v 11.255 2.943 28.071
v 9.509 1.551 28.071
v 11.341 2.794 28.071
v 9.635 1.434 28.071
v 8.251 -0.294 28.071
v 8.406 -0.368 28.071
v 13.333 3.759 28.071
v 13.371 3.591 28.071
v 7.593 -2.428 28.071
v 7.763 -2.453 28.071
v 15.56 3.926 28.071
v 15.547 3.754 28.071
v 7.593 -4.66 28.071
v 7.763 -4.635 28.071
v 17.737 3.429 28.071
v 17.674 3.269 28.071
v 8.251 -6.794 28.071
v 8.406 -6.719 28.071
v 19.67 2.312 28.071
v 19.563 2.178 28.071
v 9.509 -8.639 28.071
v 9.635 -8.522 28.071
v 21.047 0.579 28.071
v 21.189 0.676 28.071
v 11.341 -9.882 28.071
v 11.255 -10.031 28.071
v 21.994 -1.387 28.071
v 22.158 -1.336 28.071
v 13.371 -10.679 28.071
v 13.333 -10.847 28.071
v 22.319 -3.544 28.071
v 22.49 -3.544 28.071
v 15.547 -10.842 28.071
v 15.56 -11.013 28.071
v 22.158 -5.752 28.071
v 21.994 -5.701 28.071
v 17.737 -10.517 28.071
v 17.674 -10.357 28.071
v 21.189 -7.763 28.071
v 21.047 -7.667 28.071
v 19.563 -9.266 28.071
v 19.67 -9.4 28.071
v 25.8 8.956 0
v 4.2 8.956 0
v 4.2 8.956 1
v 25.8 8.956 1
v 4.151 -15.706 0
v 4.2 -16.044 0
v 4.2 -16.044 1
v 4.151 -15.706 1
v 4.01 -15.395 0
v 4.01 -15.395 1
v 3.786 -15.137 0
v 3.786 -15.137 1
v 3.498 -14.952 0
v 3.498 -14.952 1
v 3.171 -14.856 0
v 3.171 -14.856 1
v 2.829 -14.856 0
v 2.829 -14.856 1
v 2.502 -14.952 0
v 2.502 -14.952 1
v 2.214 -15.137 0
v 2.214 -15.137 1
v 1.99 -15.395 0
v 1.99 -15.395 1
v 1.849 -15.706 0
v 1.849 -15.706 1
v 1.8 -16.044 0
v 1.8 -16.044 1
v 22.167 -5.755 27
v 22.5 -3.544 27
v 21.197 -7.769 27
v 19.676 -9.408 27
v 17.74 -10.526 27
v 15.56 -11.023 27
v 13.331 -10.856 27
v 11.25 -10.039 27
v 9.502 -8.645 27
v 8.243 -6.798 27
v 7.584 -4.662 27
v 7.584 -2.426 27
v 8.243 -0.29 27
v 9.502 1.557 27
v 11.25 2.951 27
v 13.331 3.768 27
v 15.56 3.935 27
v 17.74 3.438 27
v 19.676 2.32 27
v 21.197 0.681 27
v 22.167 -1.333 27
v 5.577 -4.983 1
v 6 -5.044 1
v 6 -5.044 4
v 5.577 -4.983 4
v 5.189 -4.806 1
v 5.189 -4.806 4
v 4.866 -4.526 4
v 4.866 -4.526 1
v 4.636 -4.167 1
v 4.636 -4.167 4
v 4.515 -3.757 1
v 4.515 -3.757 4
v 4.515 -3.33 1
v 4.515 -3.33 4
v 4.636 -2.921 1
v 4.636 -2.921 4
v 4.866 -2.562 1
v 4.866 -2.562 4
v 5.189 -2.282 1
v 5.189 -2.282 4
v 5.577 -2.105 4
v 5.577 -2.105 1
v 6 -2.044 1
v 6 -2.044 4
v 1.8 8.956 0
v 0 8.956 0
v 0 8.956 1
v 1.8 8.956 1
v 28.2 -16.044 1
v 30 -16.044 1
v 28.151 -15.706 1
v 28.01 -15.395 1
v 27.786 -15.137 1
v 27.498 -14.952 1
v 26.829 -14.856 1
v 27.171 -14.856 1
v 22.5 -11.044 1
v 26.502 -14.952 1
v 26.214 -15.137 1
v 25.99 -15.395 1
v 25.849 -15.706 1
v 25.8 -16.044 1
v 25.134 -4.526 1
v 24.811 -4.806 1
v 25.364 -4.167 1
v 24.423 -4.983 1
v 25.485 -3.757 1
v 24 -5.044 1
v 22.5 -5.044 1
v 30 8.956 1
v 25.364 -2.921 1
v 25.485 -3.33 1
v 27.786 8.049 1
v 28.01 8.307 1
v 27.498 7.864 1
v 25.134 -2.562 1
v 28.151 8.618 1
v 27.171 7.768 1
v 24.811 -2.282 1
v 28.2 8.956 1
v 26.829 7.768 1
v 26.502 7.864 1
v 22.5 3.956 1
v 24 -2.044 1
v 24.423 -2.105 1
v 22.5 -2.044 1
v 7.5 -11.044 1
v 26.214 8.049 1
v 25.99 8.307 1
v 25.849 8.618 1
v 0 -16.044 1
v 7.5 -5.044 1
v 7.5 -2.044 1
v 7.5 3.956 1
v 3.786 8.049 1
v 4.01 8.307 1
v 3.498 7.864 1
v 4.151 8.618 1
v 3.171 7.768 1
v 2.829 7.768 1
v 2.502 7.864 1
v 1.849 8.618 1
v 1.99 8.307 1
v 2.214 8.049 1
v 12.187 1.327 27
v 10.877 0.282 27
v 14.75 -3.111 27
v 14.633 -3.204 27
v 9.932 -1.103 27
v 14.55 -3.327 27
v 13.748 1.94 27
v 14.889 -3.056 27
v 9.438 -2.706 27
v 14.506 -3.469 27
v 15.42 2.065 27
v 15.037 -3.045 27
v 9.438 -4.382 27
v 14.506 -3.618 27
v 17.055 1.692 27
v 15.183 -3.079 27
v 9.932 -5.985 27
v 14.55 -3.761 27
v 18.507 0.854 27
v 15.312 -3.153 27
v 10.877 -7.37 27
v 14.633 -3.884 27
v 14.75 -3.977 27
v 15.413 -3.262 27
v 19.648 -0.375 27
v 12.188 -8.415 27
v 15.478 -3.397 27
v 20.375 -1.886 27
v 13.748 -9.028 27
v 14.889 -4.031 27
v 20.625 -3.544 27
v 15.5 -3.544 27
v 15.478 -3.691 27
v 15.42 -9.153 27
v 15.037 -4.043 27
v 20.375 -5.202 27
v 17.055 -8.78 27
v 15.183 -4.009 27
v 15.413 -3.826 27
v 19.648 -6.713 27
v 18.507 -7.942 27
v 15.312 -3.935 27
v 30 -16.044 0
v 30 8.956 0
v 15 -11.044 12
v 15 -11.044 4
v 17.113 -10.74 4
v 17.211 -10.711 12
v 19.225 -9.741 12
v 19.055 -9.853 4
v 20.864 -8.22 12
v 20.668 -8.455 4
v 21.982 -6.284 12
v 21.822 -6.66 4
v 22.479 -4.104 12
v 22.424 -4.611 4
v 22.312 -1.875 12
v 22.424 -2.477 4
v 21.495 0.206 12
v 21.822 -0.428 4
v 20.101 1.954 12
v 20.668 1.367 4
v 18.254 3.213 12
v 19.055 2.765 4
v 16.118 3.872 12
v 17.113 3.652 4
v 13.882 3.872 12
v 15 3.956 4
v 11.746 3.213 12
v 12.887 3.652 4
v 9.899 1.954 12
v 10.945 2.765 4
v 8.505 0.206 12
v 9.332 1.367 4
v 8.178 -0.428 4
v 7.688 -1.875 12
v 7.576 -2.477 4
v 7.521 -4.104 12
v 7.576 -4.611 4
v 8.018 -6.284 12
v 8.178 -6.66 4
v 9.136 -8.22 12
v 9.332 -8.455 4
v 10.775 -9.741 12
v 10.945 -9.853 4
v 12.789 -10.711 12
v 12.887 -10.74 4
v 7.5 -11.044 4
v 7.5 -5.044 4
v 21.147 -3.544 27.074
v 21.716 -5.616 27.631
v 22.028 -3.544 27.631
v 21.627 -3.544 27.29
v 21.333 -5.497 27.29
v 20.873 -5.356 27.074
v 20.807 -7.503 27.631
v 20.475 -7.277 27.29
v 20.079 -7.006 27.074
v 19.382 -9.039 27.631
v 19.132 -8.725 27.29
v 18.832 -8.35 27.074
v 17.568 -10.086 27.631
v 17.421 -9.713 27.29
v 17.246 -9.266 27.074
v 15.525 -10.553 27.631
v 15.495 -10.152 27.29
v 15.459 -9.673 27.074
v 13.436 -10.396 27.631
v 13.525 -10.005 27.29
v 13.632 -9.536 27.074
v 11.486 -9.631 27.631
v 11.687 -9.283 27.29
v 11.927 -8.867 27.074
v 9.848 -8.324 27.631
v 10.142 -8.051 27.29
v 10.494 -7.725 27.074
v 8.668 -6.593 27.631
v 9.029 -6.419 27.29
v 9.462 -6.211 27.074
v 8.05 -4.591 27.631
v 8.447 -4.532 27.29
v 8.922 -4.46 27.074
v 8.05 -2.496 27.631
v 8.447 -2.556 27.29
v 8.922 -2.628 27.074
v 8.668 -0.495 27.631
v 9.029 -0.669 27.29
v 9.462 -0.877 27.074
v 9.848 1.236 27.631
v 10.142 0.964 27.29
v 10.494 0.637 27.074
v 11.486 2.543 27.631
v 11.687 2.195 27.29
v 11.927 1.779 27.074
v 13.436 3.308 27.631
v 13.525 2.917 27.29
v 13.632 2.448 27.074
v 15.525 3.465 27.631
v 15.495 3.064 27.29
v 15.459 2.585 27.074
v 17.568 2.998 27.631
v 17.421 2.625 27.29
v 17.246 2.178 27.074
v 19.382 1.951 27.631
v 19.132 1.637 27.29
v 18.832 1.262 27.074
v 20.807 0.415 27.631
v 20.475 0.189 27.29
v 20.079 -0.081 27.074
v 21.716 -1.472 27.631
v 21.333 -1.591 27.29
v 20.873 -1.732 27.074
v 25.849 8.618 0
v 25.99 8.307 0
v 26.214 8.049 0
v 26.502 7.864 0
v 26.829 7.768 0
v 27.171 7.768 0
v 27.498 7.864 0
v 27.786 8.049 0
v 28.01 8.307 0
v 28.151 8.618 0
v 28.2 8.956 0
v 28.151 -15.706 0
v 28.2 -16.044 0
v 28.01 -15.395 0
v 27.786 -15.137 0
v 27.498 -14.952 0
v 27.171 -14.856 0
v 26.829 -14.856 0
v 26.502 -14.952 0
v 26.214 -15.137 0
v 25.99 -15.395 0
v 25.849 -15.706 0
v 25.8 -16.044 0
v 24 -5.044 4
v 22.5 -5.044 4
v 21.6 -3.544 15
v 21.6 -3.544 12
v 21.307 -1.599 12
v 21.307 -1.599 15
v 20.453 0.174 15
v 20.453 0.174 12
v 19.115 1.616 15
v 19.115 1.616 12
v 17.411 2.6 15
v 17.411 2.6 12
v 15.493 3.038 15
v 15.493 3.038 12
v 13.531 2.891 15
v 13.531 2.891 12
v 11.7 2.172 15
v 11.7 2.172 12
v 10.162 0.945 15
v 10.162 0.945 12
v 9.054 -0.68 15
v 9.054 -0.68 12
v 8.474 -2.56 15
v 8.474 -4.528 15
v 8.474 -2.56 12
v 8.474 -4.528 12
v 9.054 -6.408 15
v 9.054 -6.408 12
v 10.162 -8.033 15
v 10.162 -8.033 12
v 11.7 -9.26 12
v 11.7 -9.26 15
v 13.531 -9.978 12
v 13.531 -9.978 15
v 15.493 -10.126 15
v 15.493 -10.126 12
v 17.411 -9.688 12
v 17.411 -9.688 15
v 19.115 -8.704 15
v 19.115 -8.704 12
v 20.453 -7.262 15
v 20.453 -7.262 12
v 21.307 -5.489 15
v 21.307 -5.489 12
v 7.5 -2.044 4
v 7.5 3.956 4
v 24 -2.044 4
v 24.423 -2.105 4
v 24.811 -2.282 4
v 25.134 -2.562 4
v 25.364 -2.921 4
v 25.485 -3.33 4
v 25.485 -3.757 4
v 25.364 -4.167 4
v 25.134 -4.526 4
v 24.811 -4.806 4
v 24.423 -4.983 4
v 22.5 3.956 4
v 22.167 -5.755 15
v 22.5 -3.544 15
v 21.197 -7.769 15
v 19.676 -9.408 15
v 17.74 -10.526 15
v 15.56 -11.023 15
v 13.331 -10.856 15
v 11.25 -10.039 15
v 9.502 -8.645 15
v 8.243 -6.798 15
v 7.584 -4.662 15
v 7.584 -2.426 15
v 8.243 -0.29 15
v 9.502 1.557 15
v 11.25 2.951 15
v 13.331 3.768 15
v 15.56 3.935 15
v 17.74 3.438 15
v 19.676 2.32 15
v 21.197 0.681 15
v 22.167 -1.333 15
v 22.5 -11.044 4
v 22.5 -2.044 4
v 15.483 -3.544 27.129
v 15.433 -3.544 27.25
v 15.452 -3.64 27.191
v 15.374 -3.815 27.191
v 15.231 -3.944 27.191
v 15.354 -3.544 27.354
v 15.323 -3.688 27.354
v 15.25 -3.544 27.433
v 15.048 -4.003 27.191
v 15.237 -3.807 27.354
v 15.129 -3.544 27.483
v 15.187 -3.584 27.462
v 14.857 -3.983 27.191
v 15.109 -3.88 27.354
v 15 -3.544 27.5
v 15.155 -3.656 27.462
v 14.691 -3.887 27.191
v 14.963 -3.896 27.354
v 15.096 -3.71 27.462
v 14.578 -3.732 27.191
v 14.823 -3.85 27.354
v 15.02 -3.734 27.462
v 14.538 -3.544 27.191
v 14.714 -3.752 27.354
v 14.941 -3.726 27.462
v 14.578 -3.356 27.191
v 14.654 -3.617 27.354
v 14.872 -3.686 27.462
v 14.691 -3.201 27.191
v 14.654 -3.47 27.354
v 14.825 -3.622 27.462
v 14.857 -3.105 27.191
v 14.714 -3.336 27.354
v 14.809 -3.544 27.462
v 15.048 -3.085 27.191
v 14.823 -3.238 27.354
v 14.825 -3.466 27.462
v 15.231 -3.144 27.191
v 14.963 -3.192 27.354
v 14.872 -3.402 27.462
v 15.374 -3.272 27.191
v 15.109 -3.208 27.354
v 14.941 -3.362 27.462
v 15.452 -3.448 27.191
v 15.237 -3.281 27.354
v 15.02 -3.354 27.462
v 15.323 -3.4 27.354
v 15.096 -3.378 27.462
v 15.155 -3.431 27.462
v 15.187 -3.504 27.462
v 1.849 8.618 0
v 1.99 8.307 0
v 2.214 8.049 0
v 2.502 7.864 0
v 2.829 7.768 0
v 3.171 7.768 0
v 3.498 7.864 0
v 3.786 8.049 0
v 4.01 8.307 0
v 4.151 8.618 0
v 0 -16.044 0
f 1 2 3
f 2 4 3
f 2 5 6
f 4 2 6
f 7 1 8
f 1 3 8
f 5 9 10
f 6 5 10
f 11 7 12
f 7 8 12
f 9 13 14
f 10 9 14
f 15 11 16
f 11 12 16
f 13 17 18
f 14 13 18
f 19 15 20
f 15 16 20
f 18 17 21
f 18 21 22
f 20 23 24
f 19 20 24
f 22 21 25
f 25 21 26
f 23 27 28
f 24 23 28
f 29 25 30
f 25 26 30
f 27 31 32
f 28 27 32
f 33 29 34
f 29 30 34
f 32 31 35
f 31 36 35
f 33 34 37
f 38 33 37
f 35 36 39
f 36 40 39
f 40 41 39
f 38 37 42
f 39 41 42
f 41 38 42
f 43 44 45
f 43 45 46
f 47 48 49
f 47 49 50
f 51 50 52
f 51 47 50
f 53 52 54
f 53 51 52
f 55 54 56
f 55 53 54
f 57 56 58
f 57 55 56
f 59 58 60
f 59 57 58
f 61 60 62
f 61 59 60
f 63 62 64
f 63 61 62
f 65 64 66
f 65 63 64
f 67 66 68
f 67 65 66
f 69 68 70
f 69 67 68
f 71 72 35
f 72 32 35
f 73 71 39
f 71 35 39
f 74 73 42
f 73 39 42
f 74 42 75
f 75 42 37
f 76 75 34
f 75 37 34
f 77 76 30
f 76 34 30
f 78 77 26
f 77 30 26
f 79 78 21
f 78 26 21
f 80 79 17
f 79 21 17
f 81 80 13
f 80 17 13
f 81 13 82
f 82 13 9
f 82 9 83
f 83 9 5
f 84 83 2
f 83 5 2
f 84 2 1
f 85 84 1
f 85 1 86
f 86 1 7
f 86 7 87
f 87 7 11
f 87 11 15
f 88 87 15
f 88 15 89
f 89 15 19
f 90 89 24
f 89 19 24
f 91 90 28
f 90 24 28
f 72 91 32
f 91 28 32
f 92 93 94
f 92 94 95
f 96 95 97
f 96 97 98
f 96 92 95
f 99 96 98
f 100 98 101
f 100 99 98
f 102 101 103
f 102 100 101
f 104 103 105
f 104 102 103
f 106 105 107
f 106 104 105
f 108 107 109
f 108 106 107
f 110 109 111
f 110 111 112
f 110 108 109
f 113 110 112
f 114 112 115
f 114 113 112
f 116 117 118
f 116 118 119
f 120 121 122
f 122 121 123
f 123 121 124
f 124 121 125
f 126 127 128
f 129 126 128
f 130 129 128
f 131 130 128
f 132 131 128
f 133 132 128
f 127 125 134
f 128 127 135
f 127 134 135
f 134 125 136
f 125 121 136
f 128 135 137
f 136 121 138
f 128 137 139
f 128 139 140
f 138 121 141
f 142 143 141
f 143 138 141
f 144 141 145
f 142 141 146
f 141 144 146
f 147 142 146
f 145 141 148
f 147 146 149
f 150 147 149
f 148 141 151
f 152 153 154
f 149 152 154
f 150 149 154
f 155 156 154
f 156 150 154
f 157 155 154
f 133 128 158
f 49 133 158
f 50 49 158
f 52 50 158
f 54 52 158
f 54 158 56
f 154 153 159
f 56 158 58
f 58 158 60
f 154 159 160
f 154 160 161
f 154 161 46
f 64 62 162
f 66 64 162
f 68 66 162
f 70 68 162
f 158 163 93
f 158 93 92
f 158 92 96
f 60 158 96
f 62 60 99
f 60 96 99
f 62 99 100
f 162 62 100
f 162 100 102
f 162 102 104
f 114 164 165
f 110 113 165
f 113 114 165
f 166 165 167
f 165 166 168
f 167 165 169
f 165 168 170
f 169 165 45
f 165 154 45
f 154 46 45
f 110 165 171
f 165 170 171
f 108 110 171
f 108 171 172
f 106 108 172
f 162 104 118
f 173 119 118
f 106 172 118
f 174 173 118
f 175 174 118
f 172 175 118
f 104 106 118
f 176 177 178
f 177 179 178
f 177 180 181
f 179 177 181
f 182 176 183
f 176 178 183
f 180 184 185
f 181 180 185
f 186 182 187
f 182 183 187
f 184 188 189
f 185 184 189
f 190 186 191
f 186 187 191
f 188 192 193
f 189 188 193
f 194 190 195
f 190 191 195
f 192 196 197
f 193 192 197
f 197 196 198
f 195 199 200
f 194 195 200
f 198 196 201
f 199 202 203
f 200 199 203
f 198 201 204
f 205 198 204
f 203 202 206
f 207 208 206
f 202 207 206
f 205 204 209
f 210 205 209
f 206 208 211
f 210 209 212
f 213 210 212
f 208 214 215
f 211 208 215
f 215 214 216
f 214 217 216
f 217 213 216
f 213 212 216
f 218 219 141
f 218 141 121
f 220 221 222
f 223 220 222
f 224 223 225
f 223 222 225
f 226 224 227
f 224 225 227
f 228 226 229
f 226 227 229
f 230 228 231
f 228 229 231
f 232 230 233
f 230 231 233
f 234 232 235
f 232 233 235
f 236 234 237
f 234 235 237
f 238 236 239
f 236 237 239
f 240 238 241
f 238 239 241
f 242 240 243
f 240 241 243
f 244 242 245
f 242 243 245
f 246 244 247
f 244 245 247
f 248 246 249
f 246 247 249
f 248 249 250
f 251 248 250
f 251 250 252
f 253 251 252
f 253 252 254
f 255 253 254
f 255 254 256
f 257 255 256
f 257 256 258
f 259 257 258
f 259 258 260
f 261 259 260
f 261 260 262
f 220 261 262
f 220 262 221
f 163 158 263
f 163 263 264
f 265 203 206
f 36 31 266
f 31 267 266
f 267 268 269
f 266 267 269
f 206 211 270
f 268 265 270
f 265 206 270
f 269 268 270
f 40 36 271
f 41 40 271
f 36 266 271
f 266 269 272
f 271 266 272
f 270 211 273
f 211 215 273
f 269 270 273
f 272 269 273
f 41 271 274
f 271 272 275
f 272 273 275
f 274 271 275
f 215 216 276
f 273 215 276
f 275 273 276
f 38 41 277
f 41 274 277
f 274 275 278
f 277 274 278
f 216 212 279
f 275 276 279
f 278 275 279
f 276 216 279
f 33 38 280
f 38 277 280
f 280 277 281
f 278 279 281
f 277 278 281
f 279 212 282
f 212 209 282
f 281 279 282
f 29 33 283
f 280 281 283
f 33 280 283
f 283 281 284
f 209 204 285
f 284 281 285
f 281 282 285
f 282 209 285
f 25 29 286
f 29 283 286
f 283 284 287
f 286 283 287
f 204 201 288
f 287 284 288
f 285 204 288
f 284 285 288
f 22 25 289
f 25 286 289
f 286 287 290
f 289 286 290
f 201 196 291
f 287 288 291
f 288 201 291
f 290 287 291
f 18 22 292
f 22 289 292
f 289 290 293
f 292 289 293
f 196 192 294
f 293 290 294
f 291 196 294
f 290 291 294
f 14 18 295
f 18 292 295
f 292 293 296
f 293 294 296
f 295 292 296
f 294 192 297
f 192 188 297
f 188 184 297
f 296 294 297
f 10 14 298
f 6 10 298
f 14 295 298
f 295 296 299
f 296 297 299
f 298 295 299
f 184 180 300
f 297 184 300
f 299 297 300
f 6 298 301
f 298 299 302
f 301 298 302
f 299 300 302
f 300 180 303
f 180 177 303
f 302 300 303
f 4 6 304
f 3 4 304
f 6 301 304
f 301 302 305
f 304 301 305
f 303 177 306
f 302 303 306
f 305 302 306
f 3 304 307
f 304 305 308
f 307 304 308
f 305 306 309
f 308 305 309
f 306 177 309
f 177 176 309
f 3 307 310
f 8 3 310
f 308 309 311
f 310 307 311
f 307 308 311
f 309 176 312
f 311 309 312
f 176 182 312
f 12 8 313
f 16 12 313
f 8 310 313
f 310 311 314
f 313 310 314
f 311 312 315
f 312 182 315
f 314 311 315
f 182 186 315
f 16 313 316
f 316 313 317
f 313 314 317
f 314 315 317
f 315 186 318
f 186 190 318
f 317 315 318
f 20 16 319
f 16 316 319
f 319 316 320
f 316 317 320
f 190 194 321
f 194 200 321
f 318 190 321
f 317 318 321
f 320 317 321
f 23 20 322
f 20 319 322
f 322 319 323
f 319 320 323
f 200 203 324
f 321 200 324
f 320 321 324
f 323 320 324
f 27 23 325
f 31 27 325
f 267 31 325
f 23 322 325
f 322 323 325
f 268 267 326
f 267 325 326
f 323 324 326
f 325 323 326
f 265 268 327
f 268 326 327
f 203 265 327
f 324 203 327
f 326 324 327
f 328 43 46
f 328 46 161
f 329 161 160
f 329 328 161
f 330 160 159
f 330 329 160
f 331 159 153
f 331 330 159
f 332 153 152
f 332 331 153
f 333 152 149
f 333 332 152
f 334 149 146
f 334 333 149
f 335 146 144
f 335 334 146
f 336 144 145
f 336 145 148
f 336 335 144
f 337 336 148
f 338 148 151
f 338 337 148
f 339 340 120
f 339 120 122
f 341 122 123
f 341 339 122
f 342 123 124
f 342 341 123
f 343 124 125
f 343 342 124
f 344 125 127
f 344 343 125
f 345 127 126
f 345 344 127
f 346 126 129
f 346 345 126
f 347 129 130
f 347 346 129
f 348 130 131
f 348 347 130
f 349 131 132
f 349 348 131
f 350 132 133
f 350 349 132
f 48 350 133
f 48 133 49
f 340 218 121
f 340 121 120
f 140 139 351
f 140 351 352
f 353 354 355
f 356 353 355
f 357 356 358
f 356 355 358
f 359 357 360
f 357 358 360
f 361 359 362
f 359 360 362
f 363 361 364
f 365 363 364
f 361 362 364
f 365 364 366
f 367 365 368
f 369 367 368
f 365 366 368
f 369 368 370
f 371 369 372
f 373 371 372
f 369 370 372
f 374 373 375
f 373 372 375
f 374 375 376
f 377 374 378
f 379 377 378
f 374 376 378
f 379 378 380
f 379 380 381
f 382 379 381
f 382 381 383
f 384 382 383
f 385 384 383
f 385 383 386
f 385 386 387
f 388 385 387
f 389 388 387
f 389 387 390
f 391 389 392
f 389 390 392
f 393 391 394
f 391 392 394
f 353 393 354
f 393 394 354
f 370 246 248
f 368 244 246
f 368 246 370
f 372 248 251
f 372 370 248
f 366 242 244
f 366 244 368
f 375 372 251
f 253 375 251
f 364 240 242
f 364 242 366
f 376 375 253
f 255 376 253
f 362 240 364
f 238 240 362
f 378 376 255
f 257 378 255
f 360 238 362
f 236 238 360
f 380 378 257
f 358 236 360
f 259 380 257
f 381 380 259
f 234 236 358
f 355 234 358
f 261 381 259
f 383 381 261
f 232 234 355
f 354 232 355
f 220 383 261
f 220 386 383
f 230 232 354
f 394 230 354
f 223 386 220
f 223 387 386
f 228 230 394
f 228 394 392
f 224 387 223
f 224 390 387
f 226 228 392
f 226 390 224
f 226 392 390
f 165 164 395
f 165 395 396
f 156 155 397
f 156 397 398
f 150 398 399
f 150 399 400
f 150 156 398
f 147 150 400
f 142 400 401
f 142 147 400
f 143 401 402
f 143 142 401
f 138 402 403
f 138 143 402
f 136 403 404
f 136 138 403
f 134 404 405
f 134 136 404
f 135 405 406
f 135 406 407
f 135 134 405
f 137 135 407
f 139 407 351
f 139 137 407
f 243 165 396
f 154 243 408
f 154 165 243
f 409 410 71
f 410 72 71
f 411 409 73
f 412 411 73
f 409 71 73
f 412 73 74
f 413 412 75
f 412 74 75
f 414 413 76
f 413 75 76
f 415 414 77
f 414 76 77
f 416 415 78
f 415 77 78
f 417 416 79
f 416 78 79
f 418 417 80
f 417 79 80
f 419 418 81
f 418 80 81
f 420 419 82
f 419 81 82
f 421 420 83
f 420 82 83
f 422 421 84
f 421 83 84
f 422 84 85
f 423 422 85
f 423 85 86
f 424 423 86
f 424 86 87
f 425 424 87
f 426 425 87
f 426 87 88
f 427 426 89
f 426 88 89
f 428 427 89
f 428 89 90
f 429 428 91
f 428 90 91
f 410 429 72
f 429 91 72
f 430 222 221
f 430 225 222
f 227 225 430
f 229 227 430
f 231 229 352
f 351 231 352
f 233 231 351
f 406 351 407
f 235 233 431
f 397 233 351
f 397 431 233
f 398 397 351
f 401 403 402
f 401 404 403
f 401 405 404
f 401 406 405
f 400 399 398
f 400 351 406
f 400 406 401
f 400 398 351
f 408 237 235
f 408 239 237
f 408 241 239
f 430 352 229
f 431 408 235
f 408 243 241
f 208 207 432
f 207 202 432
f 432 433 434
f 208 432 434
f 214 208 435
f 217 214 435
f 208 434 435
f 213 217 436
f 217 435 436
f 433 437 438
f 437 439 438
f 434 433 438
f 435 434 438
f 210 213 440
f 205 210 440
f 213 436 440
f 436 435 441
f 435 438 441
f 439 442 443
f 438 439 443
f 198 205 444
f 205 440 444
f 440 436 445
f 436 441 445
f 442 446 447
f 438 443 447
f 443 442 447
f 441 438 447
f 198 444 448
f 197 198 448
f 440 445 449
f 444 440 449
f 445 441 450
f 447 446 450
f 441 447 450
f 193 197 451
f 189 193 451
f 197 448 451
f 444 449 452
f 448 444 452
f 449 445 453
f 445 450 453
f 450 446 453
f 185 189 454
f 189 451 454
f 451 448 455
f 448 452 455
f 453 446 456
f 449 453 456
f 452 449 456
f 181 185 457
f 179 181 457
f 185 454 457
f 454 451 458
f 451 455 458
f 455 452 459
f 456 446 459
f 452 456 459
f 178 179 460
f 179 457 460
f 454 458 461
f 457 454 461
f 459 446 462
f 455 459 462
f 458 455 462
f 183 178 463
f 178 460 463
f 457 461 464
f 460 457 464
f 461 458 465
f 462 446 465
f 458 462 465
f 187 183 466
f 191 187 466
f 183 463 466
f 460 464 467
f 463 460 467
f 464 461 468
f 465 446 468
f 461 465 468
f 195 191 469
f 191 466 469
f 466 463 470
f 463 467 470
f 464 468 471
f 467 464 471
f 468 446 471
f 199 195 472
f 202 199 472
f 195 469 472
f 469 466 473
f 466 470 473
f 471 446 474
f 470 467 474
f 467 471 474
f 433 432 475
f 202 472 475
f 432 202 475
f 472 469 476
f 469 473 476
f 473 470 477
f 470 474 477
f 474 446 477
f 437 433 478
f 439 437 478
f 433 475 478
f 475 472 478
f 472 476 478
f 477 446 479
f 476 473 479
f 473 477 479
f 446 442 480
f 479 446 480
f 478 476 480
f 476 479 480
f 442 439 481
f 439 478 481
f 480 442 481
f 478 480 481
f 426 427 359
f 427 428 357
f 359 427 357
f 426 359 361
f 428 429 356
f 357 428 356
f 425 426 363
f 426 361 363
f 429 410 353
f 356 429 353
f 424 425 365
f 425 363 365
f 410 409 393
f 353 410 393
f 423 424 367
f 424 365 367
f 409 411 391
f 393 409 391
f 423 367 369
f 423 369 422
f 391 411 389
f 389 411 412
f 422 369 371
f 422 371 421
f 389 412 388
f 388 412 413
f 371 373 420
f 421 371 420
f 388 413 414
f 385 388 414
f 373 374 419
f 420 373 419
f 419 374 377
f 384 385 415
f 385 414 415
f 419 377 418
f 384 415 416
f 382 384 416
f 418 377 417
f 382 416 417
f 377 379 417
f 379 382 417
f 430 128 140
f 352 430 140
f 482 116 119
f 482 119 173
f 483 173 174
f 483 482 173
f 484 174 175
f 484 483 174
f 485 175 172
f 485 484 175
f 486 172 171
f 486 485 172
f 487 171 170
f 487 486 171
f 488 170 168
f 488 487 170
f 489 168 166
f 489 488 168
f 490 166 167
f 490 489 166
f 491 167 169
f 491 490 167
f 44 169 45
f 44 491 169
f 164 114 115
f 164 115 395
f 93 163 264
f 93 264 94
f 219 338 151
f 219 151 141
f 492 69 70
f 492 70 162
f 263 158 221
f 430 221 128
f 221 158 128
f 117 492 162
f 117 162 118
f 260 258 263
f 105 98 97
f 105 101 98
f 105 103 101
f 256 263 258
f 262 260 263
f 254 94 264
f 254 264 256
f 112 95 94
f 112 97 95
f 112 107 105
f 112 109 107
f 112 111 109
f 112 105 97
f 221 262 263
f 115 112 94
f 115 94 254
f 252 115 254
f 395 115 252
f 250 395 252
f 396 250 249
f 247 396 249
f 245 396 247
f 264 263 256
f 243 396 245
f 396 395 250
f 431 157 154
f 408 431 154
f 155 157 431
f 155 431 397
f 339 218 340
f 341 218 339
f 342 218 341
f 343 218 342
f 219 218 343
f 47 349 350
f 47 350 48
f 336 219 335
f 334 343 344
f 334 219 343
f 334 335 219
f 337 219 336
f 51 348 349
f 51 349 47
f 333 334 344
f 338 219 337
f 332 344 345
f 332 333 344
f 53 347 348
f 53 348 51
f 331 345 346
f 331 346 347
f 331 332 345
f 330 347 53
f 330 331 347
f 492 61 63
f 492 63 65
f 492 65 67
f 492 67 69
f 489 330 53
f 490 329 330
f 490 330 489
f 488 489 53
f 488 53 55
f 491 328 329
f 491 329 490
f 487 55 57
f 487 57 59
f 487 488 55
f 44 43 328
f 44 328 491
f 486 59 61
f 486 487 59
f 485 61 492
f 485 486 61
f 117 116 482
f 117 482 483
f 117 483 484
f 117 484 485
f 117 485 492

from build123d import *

# Parameters (mm, degrees)
EXTRUDE_1_DEPTH = 1
EXTRUDE_2_DEPTH = 3
SKETCH_3_W      = 15
SKETCH_3_H      = 15
EXTRUDE_3_DEPTH = 3
SKETCH_4_R      = 7.5
EXTRUDE_4_DEPTH = 8
SKETCH_5_R      = 6.6
EXTRUDE_5_DEPTH = 3


with BuildPart() as part:
    # 草图1 → 凸台-拉伸1 (new body)
    with BuildSketch(Plane.XY):
        with BuildLine():
            Line((4.2, 8.956043956), (25.8, 8.956043956))
            ThreePointArc((25.8, 8.956043956), (27, 7.756043956), (28.2, 8.956043956))
            Line((28.2, 8.956043956), (30, 8.956043956))
            Line((30, 8.956043956), (30, -16.043956044))
            Line((30, -16.043956044), (28.2, -16.043956044))
            ThreePointArc((28.2, -16.043956044), (27, -14.843956044), (25.8, -16.043956044))
            Line((25.8, -16.043956044), (4.2, -16.043956044))
            ThreePointArc((4.2, -16.043956044), (3, -14.843956044), (1.8, -16.043956044))
            Line((1.8, -16.043956044), (0, -16.043956044))
            Line((0, -16.043956044), (0, 8.956043956))
            Line((0, 8.956043956), (1.8, 8.956043956))
            ThreePointArc((1.8, 8.956043956), (3, 7.756043956), (4.2, 8.956043956))
        make_face()
    extrude(amount=EXTRUDE_1_DEPTH)

    # 草图2 → 凸台-拉伸2 (add)
    with BuildSketch(Plane.XY.offset(1)):
        with BuildLine():
            Line((6, -2.043956044), (24, -2.043956044))
            ThreePointArc((24, -2.043956044), (25.5, -3.543956044), (24, -5.043956044))
            Line((24, -5.043956044), (6, -5.043956044))
            ThreePointArc((6, -5.043956044), (4.5, -3.543956044), (6, -2.043956044))
        make_face()
    extrude(amount=EXTRUDE_2_DEPTH)

    # 草图3 → 凸台-拉伸3 (add)
    with BuildSketch(Plane.XY.offset(1)):
        with Locations((15, -3.543956044)):
            Rectangle(SKETCH_3_W, SKETCH_3_H)
    extrude(amount=EXTRUDE_3_DEPTH)

    # 草图4 → 凸台-拉伸4 (add)
    with BuildSketch(Plane.XY.offset(4)):
        with Locations(Location((15, -3.543956044, 0), (0, 0, 270))):
            Circle(SKETCH_4_R)
    extrude(amount=EXTRUDE_4_DEPTH)

    # 草图5 → 凸台-拉伸5 (add)
    with BuildSketch(Plane.XY.offset(12)):
        with Locations((15, -3.543956044)):
            Circle(SKETCH_5_R)
    extrude(amount=EXTRUDE_5_DEPTH)

    # 草图7 → 旋转2 (revolve)
    with BuildSketch(Plane(origin=(0, -3.543956044, 0), x_dir=(-1, 0, 0), z_dir=(0, -1, 0)), mode=Mode.PRIVATE) as revolve_2_sk:
        with BuildLine():
            Line((-15, -15), (-7.5, -15))
            Line((-7.5, -15), (-7.5, -27))
            Line((-7.5, -27), (-7.5095257, -28.070803971))
            Line((-7.5095257, -28.070803971), (-7.681219097, -28.070803971))
            ThreePointArc((-7.681219097, -28.070803971), (-8.373062515, -27.290151024), (-9.375, -27))
            Line((-9.375, -27), (-14.500000001, -27))
            ThreePointArc((-14.500000001, -27), (-14.646437925, -27.353569269), (-15, -27.500024563))
            Line((-15, -27.500024563), (-15, -27.000024563))
            Line((-15, -27.000024563), (-15, -22))
            Line((-15, -22), (-15, -15))
        make_face()
    revolve(revolve_2_sk.sketch.rotate(Axis((15, -3.543956044, 22), (0, 0, -1)), 180), axis=Axis((15, -3.543956044, 22), (0, 0, -1)))


solid = part.part
